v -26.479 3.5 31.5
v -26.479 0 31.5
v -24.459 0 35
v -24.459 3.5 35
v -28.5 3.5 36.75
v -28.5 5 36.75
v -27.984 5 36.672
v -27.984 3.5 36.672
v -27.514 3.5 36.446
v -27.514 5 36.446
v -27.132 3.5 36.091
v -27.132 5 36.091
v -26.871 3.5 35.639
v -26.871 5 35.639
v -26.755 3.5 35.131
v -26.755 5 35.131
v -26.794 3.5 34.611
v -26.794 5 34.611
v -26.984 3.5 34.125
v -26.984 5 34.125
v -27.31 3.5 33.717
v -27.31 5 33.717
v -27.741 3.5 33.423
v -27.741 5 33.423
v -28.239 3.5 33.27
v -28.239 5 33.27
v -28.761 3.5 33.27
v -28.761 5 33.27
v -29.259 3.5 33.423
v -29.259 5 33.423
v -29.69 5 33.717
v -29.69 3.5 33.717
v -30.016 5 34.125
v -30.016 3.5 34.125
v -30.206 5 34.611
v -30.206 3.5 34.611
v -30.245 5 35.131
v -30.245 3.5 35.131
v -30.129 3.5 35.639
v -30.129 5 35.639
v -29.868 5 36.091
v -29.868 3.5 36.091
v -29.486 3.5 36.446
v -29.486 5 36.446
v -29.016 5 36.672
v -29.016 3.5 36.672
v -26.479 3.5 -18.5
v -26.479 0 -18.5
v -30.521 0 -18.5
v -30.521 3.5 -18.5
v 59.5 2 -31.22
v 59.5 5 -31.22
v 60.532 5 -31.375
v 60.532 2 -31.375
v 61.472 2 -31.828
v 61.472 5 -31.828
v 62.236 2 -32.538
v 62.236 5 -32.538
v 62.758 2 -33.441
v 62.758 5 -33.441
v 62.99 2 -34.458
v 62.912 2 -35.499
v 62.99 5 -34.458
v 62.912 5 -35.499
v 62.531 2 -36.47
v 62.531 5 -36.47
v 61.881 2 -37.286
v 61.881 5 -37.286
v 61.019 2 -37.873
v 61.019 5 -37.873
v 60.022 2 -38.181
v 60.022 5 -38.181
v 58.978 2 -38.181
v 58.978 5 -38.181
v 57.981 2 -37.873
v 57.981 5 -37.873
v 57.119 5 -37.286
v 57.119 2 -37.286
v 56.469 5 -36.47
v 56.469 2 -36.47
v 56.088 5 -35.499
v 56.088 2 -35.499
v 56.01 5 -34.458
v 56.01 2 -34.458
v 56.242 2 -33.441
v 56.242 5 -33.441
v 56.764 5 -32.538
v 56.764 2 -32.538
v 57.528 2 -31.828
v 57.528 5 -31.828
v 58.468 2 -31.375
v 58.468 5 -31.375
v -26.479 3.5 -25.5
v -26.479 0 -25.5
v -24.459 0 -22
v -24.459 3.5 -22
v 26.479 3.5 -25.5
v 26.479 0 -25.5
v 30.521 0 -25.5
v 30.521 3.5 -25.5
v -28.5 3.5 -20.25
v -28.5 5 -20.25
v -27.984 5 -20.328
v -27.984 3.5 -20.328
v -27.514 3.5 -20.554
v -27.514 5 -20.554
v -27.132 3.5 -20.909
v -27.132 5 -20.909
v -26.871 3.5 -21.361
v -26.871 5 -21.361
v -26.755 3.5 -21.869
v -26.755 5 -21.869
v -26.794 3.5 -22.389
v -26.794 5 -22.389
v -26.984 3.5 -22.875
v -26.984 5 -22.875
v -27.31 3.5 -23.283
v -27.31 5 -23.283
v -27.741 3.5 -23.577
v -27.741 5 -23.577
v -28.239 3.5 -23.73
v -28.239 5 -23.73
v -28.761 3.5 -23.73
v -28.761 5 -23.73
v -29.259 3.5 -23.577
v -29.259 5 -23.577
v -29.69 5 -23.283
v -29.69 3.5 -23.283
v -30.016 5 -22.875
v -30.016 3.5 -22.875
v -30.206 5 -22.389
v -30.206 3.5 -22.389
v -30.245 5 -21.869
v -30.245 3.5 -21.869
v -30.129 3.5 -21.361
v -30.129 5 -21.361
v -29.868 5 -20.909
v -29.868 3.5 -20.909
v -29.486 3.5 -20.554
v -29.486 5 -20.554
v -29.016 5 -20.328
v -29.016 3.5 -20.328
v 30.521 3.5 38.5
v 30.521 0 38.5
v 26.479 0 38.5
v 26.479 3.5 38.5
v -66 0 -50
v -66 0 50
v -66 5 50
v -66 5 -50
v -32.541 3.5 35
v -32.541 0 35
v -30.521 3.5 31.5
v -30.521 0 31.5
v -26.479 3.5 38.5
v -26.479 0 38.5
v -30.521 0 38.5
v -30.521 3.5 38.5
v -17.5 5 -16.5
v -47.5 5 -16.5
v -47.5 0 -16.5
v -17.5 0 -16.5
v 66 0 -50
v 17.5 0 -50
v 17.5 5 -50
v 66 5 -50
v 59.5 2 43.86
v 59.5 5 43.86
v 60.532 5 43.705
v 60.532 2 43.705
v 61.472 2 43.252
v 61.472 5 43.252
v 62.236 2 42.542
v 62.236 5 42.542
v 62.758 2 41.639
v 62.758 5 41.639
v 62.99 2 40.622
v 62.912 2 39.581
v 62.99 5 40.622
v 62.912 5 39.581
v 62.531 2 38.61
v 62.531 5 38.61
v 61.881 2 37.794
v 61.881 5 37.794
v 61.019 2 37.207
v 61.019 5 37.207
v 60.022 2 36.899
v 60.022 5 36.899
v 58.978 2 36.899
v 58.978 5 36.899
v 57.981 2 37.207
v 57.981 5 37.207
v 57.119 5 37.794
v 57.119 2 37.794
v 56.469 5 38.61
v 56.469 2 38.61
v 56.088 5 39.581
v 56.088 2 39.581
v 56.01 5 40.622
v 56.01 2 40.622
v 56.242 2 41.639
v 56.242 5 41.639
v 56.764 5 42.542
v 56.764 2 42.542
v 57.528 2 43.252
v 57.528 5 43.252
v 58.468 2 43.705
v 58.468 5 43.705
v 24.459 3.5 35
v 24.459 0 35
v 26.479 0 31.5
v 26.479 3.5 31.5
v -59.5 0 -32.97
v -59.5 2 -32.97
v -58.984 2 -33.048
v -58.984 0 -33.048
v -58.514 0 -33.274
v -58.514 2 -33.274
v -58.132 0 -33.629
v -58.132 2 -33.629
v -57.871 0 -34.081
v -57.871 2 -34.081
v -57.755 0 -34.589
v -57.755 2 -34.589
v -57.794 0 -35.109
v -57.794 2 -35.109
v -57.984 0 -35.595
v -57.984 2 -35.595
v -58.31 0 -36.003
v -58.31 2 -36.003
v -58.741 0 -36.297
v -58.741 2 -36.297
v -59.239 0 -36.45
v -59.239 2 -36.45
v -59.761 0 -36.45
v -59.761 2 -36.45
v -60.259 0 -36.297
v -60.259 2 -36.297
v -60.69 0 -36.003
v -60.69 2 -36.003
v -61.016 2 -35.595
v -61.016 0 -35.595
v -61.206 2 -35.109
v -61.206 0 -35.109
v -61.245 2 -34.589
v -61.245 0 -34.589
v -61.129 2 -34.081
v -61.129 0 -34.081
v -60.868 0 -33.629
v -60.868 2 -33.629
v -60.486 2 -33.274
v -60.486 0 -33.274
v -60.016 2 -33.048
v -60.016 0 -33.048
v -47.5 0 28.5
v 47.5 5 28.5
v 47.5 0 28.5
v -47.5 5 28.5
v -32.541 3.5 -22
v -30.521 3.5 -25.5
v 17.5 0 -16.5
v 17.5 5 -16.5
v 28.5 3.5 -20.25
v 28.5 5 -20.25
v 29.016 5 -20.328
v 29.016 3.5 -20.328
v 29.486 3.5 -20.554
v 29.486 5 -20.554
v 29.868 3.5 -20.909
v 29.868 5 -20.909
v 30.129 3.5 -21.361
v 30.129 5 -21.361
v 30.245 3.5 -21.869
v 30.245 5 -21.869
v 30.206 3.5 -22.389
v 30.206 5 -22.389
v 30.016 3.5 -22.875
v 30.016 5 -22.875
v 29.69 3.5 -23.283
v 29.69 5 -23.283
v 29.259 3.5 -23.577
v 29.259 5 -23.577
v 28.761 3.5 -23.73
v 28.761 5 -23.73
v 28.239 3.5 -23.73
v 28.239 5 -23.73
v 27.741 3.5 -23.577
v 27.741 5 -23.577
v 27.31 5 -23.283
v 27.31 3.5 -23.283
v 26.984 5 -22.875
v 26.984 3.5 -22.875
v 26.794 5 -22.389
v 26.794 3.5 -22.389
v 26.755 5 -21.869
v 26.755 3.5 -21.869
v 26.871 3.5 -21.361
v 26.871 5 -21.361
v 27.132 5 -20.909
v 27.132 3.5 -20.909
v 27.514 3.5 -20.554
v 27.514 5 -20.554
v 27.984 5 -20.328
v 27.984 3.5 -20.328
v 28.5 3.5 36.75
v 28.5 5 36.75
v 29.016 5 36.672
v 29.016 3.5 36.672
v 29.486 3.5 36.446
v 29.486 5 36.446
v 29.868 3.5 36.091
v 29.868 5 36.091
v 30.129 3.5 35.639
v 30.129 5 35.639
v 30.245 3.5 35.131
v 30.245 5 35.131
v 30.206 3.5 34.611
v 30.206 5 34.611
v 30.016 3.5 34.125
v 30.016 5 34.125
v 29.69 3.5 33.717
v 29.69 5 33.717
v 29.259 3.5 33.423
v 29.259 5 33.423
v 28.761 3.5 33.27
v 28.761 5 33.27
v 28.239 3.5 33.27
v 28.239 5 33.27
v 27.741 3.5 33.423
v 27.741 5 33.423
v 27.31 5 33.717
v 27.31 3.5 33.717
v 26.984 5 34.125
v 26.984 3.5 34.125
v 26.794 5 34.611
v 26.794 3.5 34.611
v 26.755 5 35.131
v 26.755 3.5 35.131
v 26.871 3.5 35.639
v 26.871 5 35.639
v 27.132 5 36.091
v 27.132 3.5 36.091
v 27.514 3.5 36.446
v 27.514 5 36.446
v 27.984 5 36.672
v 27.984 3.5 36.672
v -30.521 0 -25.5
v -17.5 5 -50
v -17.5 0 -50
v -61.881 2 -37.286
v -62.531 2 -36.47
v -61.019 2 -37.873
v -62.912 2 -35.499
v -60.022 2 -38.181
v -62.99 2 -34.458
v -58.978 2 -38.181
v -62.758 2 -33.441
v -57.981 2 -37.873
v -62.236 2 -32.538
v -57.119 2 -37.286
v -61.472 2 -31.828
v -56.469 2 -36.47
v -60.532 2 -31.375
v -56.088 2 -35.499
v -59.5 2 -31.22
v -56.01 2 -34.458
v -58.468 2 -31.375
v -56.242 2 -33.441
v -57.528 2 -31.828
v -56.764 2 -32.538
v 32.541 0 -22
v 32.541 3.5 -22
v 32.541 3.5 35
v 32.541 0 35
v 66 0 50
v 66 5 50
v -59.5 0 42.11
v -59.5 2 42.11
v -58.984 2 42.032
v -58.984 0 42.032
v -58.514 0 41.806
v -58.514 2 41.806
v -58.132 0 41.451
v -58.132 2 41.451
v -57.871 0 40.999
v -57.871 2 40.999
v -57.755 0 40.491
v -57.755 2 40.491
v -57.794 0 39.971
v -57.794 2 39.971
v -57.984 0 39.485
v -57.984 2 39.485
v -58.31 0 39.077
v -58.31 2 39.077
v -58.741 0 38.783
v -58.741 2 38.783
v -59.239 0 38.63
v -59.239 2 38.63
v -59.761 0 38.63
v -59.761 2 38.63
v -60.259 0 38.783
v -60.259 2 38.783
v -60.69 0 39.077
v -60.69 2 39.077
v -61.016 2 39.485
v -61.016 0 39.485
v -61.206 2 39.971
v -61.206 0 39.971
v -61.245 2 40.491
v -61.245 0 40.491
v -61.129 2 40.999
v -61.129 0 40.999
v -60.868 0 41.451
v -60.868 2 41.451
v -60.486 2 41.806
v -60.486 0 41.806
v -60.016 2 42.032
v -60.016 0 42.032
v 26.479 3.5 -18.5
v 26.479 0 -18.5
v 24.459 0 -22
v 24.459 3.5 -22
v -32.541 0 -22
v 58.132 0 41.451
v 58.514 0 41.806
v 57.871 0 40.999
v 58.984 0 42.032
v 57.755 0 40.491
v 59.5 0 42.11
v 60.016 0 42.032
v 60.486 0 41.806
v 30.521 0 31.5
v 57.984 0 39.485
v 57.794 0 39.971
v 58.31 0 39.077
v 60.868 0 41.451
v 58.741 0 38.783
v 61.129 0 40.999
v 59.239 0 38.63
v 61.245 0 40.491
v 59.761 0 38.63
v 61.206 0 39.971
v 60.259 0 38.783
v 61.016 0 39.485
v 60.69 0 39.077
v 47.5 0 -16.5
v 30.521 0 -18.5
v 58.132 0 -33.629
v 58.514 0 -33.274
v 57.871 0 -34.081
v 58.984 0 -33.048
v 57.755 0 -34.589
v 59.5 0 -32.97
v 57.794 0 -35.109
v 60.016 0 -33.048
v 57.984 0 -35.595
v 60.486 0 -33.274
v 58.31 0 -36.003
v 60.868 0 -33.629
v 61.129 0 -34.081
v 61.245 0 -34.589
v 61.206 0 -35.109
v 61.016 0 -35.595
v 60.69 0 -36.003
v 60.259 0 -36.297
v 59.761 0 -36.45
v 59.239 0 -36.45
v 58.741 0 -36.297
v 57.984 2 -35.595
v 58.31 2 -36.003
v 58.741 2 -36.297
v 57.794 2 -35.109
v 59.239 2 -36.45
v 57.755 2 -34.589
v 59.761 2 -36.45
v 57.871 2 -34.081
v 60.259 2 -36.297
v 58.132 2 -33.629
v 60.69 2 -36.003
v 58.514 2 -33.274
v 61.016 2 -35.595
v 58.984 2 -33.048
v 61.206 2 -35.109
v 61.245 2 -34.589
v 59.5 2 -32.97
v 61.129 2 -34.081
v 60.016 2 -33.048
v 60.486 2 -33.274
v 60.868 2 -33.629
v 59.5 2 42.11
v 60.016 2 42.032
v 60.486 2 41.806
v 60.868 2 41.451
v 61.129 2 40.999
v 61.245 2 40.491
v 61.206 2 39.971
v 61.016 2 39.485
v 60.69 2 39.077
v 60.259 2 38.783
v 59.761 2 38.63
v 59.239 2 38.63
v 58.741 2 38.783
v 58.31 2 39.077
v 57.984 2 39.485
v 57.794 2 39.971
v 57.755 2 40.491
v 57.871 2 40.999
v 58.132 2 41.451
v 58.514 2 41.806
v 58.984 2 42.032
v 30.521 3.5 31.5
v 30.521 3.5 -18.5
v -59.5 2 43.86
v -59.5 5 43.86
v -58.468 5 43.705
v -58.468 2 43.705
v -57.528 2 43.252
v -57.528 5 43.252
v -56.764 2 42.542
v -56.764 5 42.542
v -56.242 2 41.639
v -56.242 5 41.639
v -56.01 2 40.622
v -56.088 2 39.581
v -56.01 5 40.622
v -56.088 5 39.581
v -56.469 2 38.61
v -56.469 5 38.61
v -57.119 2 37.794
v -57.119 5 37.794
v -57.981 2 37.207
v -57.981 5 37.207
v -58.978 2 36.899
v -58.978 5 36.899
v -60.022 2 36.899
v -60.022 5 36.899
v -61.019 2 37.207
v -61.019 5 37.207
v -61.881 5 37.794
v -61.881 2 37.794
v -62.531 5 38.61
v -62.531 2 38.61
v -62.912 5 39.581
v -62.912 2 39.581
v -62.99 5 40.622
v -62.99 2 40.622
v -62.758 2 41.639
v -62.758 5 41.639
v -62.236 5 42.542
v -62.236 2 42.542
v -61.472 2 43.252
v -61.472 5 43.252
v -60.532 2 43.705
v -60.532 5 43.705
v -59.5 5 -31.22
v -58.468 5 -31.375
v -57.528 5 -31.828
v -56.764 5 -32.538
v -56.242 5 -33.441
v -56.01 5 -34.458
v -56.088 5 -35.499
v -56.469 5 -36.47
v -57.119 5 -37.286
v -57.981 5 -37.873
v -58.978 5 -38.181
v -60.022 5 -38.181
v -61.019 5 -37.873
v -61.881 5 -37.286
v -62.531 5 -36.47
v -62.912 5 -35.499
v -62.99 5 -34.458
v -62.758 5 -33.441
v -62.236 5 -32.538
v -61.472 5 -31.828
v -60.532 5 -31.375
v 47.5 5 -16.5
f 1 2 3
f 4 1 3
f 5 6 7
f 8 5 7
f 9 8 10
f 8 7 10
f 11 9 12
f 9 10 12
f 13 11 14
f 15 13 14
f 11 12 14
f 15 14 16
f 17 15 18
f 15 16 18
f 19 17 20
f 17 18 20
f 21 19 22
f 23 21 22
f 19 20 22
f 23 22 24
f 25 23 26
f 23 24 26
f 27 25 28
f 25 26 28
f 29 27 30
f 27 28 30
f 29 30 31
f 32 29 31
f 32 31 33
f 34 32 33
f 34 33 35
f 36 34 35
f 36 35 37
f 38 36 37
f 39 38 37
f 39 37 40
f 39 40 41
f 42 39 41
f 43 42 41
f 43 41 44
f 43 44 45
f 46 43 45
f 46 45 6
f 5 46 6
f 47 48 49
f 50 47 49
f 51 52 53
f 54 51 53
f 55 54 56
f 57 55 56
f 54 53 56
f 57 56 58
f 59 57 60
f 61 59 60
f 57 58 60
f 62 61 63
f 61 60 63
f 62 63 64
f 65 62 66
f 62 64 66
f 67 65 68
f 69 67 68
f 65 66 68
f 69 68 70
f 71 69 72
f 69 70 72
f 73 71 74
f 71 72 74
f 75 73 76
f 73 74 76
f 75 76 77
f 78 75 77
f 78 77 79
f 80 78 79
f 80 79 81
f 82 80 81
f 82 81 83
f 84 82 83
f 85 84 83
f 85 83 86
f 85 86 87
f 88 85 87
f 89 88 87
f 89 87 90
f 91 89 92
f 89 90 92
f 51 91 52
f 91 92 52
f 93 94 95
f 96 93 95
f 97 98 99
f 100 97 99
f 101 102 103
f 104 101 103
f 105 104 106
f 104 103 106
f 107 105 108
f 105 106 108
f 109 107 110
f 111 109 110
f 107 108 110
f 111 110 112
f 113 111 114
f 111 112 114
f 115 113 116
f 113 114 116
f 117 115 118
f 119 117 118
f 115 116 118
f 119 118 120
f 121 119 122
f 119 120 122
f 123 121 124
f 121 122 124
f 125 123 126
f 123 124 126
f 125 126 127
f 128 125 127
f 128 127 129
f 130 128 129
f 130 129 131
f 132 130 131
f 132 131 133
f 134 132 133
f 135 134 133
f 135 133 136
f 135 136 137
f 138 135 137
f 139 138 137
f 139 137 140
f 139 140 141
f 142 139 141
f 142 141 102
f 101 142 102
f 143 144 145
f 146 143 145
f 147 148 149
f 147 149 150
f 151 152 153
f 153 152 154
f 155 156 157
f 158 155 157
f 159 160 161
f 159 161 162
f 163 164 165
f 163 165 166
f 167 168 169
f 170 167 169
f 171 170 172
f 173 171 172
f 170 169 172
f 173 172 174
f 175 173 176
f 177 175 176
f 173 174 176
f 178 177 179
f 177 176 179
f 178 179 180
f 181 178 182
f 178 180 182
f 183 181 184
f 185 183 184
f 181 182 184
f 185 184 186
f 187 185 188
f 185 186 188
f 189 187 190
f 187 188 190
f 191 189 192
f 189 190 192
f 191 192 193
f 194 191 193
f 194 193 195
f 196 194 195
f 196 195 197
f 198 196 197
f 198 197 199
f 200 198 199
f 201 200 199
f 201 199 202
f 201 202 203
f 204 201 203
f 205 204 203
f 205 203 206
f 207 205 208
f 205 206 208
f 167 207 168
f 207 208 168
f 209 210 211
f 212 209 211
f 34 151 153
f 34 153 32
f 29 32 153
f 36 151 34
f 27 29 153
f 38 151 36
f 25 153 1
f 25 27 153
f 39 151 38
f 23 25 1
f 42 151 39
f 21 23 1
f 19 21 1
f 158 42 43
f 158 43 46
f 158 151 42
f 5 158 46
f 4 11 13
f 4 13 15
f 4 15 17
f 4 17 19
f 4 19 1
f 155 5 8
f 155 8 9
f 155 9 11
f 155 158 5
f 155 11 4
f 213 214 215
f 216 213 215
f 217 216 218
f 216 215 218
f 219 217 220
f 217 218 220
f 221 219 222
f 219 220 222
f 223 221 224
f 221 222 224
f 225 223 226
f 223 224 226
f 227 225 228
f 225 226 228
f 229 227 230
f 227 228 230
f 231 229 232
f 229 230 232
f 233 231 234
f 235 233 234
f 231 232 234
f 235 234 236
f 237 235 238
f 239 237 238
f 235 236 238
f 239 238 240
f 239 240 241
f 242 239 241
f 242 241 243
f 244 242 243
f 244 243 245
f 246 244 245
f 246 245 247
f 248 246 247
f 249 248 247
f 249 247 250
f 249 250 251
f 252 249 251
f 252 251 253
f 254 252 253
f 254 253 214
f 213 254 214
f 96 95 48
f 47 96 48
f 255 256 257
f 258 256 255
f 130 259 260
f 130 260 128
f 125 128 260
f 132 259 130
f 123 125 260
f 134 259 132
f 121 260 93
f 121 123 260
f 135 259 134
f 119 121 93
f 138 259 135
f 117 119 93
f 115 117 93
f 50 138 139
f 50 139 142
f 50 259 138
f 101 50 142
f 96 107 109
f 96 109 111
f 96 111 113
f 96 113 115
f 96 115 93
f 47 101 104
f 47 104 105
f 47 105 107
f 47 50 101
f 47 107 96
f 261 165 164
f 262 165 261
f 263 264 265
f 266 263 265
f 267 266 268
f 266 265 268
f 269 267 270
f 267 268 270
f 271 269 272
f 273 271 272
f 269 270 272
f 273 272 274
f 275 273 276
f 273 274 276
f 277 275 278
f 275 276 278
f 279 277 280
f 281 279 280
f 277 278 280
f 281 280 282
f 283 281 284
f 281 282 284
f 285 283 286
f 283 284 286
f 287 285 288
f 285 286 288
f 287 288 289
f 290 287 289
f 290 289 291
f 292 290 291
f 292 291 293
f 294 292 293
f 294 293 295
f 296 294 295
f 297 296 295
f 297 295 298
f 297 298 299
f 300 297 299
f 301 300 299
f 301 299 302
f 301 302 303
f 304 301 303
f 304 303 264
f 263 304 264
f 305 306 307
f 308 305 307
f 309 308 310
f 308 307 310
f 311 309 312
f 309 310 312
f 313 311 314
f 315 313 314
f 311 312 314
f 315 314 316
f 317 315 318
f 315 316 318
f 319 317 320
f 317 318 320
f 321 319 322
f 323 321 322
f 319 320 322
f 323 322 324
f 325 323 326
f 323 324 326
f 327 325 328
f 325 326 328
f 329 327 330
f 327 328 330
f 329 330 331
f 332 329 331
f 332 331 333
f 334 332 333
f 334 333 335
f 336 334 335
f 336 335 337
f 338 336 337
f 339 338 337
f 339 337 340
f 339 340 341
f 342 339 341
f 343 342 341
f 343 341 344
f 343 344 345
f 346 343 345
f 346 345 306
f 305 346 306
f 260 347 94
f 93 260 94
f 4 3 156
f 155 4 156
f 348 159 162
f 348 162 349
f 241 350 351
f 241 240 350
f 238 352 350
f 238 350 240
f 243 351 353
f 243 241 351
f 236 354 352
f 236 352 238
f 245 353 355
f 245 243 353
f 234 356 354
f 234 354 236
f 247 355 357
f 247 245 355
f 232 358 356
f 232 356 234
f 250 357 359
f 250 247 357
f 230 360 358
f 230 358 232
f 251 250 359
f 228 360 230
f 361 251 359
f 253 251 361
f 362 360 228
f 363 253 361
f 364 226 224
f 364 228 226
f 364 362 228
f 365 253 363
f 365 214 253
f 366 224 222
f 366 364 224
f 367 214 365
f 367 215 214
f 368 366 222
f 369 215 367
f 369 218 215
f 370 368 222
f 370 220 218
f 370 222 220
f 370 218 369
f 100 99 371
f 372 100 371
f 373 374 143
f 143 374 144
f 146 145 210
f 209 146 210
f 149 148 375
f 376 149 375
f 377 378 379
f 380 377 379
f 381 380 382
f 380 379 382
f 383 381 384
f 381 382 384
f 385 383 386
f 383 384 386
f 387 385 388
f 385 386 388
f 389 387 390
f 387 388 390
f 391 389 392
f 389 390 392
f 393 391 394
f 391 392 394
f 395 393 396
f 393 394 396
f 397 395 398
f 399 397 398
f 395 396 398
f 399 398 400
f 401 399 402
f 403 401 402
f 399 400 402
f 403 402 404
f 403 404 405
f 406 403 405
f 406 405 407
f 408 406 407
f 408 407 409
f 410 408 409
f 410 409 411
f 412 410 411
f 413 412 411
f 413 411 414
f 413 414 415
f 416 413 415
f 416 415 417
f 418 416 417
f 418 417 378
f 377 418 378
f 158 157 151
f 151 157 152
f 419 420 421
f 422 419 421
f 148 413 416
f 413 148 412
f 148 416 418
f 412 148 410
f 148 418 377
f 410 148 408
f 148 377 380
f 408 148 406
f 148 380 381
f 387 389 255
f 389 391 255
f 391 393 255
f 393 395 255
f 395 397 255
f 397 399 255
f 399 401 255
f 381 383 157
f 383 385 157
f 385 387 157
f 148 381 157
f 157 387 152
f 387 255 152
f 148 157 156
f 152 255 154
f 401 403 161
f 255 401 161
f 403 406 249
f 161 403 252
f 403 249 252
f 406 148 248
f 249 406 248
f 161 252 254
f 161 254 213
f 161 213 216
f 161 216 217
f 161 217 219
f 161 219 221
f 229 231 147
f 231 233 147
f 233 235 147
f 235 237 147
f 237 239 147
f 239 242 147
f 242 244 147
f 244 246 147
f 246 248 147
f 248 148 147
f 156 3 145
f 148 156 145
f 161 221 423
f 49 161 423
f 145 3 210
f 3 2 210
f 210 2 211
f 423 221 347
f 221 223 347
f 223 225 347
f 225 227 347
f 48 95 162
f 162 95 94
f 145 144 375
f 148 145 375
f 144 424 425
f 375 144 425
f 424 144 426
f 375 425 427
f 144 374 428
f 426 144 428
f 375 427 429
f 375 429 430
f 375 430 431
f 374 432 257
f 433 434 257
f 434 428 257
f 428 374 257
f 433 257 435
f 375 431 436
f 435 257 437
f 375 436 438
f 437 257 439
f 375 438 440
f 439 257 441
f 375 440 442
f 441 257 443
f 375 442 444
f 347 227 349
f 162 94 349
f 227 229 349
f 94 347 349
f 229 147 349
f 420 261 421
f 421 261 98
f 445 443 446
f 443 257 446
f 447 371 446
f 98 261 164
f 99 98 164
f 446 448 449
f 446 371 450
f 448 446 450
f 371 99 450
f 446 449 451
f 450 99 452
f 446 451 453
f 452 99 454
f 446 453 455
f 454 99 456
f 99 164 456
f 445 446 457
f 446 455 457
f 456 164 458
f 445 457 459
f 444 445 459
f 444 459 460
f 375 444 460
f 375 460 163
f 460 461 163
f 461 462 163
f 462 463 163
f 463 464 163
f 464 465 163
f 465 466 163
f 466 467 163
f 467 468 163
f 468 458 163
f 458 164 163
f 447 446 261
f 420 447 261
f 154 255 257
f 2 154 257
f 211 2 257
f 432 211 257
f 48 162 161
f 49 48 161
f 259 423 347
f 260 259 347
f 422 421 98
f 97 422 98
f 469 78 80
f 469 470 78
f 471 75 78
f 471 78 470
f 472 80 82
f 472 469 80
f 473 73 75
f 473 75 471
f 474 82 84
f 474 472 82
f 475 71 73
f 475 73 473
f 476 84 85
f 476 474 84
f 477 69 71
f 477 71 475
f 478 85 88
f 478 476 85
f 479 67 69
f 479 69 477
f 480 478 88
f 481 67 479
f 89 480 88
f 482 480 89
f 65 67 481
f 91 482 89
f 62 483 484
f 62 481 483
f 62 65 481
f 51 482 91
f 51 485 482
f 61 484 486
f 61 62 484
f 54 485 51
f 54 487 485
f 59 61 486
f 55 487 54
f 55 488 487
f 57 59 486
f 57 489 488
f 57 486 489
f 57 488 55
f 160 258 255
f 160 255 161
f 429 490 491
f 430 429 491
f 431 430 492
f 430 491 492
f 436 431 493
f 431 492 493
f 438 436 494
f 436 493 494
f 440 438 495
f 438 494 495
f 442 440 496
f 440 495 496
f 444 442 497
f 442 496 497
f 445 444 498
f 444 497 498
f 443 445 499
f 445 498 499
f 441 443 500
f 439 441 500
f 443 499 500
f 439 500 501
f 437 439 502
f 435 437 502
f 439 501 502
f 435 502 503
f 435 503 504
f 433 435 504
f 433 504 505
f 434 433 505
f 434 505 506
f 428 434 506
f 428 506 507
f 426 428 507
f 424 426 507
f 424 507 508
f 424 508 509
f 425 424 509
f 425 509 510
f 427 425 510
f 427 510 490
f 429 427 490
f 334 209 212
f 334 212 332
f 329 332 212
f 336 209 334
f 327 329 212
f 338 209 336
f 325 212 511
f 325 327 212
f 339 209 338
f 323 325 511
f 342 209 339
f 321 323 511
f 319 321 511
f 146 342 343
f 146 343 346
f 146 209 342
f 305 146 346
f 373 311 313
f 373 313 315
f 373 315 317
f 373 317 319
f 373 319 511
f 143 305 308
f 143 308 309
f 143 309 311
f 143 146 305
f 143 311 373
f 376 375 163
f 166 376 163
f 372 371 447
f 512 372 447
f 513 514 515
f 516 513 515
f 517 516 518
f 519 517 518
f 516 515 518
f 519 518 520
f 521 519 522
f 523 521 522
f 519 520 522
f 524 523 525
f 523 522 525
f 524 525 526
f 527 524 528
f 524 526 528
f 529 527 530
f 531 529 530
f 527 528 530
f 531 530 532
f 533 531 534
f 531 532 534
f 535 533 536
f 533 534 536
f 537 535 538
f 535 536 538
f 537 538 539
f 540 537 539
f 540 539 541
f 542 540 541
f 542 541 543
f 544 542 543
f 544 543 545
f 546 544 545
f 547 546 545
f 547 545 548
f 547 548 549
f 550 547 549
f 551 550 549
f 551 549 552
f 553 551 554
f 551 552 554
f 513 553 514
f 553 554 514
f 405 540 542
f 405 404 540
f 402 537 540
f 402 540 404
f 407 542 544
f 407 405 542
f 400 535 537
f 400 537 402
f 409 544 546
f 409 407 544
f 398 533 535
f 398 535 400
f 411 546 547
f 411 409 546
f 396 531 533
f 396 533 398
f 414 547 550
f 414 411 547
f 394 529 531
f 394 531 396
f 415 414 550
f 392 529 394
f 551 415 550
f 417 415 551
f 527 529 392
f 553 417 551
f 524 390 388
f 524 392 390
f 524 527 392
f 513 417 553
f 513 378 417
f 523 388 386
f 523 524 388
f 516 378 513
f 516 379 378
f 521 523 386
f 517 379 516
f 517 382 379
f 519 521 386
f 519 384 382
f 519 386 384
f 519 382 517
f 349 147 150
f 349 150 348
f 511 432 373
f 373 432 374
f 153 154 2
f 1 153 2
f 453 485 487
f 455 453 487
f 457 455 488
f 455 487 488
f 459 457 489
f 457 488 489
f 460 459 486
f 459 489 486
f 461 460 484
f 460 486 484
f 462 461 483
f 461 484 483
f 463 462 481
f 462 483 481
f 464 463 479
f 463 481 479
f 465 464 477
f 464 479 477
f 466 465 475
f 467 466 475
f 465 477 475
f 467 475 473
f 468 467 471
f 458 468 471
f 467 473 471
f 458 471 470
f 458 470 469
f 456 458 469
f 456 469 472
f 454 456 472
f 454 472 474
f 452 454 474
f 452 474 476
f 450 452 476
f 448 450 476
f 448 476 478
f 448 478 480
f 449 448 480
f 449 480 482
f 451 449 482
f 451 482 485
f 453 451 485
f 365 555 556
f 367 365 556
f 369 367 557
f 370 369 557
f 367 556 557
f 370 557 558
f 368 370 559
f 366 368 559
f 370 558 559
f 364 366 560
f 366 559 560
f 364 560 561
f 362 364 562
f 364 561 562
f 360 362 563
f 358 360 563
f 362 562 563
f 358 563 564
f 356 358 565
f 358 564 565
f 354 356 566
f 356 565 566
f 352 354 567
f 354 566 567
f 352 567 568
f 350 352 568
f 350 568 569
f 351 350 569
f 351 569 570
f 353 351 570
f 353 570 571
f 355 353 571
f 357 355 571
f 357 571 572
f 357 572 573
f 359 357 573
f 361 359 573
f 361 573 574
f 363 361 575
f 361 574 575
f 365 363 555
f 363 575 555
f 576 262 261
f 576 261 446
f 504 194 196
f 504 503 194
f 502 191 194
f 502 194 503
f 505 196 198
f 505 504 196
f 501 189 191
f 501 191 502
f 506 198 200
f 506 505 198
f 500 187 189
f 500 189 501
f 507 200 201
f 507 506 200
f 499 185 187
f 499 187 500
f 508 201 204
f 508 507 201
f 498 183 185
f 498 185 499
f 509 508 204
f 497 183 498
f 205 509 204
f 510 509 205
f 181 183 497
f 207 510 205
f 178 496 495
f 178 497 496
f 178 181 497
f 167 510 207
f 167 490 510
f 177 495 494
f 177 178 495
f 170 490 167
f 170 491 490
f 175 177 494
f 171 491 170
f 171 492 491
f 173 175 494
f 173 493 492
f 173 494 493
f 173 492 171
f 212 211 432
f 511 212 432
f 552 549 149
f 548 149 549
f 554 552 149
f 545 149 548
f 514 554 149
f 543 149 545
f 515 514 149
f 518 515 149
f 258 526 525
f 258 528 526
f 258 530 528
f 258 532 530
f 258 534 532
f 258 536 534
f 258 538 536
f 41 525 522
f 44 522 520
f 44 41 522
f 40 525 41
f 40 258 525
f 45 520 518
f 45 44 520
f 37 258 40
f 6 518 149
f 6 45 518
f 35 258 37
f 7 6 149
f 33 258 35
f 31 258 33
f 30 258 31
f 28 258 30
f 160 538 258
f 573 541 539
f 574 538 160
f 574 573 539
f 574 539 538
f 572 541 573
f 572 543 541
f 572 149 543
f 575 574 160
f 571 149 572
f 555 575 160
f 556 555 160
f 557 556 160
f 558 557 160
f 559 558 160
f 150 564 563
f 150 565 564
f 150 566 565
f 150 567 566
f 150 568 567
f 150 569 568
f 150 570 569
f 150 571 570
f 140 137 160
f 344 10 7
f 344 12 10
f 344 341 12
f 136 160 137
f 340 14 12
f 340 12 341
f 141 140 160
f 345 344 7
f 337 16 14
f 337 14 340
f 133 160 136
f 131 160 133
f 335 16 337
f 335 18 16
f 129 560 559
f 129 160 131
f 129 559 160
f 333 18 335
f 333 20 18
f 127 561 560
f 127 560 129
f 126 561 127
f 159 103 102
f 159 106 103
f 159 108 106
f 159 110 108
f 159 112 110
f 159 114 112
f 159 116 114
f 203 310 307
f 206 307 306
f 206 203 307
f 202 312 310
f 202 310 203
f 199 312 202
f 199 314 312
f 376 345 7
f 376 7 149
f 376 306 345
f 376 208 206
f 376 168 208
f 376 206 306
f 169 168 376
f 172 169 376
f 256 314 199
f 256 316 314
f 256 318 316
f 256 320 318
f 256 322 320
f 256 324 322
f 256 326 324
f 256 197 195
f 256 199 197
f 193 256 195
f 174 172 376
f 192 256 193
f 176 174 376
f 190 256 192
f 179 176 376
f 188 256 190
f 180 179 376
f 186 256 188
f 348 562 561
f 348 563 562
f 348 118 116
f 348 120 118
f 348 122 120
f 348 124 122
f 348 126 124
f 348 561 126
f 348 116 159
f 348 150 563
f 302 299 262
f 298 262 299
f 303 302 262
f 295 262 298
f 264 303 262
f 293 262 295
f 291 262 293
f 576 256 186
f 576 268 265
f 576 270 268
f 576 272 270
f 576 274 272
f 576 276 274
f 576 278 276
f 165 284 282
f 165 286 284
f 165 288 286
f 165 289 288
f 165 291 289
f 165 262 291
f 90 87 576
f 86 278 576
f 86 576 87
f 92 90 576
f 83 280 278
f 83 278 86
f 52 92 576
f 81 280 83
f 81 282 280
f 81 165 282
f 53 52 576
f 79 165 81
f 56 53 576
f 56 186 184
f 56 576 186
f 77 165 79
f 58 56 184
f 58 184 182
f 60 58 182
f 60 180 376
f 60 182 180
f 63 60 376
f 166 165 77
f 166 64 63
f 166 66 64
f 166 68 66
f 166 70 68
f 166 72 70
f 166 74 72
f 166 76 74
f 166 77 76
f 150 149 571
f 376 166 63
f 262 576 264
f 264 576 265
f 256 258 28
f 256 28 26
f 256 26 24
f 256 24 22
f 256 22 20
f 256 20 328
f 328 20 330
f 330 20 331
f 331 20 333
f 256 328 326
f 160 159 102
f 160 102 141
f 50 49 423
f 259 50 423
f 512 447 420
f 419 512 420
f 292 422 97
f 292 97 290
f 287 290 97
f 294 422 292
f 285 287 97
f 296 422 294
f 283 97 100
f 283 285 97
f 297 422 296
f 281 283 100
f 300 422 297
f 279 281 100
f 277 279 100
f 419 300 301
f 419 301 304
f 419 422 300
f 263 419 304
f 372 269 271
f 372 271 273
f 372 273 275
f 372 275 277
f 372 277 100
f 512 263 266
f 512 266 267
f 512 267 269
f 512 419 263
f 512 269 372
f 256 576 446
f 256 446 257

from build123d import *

# Parameters (mm, degrees)
SKETCH1_W           = 132
SKETCH1_H           = 100
BOSS_EXTRUDE1_DEPTH = 5
SKETCH2_R           = 1.75
CUT_EXTRUDE1_DEPTH  = 56
CUT_EXTRUDE4_DEPTH  = 103
SKETCH4_R           = 1.75
CUT_EXTRUDE5_DEPTH  = 103
SKETCH6_R           = 3.5
CUT_EXTRUDE6_DEPTH  = 3
CUT_EXTRUDE7_DEPTH  = 3.5


with BuildPart() as part:
    # Sketch1 → Boss-Extrude1 (new body)
    with BuildSketch(Plane(origin=(0, 0, 0), x_dir=(1, 0, 0), z_dir=(0, 1, 0))):
        Rectangle(SKETCH1_W, SKETCH1_H)
    extrude(amount=BOSS_EXTRUDE1_DEPTH)

    # Sketch2 → Cut-Extrude1 (cut)
    with BuildSketch(Plane(origin=(0, 5, 0), x_dir=(1, 0, 0), z_dir=(0, 1, 0))):
        with Locations(Location((-59.5, 34.72, 0), (0, 0, 270))):
            Circle(SKETCH2_R)
        with Locations(Location((-59.5, -40.36, 0), (0, 0, 270))):
            Circle(SKETCH2_R)
        with Locations(Location((59.5, -40.36, 0), (0, 0, 270))):
            Circle(SKETCH2_R)
        with Locations(Location((59.5, 34.72, 0), (0, 0, 270))):
            Circle(SKETCH2_R)
    extrude(amount=-CUT_EXTRUDE1_DEPTH, mode=Mode.SUBTRACT)

    # Sketch3 → Cut-Extrude4 (cut)
    with BuildSketch(Plane(origin=(0, 5, 0), x_dir=(1, 0, 0), z_dir=(0, 1, 0))):
        Polygon((-17.5, 50), (17.5, 50), (17.5, 16.5), (47.5, 16.5), (47.5, -28.5), (-47.5, -28.5), (-47.5, 16.5), (-17.5, 16.5), align=None)
    extrude(amount=-CUT_EXTRUDE4_DEPTH, mode=Mode.SUBTRACT)

    # Sketch4 → Cut-Extrude5 (cut)
    with BuildSketch(Plane(origin=(0, 5, 0), x_dir=(1, 0, 0), z_dir=(0, 1, 0))):
        with Locations(Location((-28.5, 22, 0), (0, 0, 270))):
            Circle(SKETCH4_R)
        with Locations(Location((-28.5, -35, 0), (0, 0, 270))):
            Circle(SKETCH4_R)
        with Locations(Location((28.5, -35, 0), (0, 0, 270))):
            Circle(SKETCH4_R)
        with Locations(Location((28.5, 22, 0), (0, 0, 270))):
            Circle(SKETCH4_R)
    extrude(amount=-CUT_EXTRUDE5_DEPTH, mode=Mode.SUBTRACT)

    # Sketch6 → Cut-Extrude6 (cut)
    with BuildSketch(Plane(origin=(0, 5, 0), x_dir=(1, 0, 0), z_dir=(0, 1, 0))):
        with Locations(Location((-59.5, 34.72, 0), (0, 0, 270))):
            Circle(SKETCH6_R)
        with Locations(Location((-59.5, -40.36, 0), (0, 0, 270))):
            Circle(SKETCH6_R)
        with Locations(Location((59.5, -40.36, 0), (0, 0, 270))):
            Circle(SKETCH6_R)
        with Locations(Location((59.5, 34.72, 0), (0, 0, 270))):
            Circle(SKETCH6_R)
    extrude(amount=-CUT_EXTRUDE6_DEPTH, mode=Mode.SUBTRACT)

    # Sketch7 → Cut-Extrude7 (cut)
    with BuildSketch(Plane.XZ):
        Polygon((26.479274058, -25.5), (30.520725942, -25.5), (32.541451884, -22), (30.520725942, -18.5), (26.479274058, -18.5), (24.458548116, -22), align=None)
        Polygon((24.458548116, 35), (26.479274058, 31.5), (30.520725942, 31.5), (32.541451884, 35), (30.520725942, 38.5), (26.479274058, 38.5), align=None)
        Polygon((-30.520725942, 38.5), (-32.541451884, 35), (-30.520725942, 31.5), (-26.479274058, 31.5), (-24.458548116, 35), (-26.479274058, 38.5), align=None)
        Polygon((-32.541451884, -22), (-30.520725942, -25.5), (-26.479274058, -25.5), (-24.458548116, -22), (-26.479274058, -18.5), (-30.520725942, -18.5), align=None)
    extrude(amount=-CUT_EXTRUDE7_DEPTH, mode=Mode.SUBTRACT)


solid = part.part
